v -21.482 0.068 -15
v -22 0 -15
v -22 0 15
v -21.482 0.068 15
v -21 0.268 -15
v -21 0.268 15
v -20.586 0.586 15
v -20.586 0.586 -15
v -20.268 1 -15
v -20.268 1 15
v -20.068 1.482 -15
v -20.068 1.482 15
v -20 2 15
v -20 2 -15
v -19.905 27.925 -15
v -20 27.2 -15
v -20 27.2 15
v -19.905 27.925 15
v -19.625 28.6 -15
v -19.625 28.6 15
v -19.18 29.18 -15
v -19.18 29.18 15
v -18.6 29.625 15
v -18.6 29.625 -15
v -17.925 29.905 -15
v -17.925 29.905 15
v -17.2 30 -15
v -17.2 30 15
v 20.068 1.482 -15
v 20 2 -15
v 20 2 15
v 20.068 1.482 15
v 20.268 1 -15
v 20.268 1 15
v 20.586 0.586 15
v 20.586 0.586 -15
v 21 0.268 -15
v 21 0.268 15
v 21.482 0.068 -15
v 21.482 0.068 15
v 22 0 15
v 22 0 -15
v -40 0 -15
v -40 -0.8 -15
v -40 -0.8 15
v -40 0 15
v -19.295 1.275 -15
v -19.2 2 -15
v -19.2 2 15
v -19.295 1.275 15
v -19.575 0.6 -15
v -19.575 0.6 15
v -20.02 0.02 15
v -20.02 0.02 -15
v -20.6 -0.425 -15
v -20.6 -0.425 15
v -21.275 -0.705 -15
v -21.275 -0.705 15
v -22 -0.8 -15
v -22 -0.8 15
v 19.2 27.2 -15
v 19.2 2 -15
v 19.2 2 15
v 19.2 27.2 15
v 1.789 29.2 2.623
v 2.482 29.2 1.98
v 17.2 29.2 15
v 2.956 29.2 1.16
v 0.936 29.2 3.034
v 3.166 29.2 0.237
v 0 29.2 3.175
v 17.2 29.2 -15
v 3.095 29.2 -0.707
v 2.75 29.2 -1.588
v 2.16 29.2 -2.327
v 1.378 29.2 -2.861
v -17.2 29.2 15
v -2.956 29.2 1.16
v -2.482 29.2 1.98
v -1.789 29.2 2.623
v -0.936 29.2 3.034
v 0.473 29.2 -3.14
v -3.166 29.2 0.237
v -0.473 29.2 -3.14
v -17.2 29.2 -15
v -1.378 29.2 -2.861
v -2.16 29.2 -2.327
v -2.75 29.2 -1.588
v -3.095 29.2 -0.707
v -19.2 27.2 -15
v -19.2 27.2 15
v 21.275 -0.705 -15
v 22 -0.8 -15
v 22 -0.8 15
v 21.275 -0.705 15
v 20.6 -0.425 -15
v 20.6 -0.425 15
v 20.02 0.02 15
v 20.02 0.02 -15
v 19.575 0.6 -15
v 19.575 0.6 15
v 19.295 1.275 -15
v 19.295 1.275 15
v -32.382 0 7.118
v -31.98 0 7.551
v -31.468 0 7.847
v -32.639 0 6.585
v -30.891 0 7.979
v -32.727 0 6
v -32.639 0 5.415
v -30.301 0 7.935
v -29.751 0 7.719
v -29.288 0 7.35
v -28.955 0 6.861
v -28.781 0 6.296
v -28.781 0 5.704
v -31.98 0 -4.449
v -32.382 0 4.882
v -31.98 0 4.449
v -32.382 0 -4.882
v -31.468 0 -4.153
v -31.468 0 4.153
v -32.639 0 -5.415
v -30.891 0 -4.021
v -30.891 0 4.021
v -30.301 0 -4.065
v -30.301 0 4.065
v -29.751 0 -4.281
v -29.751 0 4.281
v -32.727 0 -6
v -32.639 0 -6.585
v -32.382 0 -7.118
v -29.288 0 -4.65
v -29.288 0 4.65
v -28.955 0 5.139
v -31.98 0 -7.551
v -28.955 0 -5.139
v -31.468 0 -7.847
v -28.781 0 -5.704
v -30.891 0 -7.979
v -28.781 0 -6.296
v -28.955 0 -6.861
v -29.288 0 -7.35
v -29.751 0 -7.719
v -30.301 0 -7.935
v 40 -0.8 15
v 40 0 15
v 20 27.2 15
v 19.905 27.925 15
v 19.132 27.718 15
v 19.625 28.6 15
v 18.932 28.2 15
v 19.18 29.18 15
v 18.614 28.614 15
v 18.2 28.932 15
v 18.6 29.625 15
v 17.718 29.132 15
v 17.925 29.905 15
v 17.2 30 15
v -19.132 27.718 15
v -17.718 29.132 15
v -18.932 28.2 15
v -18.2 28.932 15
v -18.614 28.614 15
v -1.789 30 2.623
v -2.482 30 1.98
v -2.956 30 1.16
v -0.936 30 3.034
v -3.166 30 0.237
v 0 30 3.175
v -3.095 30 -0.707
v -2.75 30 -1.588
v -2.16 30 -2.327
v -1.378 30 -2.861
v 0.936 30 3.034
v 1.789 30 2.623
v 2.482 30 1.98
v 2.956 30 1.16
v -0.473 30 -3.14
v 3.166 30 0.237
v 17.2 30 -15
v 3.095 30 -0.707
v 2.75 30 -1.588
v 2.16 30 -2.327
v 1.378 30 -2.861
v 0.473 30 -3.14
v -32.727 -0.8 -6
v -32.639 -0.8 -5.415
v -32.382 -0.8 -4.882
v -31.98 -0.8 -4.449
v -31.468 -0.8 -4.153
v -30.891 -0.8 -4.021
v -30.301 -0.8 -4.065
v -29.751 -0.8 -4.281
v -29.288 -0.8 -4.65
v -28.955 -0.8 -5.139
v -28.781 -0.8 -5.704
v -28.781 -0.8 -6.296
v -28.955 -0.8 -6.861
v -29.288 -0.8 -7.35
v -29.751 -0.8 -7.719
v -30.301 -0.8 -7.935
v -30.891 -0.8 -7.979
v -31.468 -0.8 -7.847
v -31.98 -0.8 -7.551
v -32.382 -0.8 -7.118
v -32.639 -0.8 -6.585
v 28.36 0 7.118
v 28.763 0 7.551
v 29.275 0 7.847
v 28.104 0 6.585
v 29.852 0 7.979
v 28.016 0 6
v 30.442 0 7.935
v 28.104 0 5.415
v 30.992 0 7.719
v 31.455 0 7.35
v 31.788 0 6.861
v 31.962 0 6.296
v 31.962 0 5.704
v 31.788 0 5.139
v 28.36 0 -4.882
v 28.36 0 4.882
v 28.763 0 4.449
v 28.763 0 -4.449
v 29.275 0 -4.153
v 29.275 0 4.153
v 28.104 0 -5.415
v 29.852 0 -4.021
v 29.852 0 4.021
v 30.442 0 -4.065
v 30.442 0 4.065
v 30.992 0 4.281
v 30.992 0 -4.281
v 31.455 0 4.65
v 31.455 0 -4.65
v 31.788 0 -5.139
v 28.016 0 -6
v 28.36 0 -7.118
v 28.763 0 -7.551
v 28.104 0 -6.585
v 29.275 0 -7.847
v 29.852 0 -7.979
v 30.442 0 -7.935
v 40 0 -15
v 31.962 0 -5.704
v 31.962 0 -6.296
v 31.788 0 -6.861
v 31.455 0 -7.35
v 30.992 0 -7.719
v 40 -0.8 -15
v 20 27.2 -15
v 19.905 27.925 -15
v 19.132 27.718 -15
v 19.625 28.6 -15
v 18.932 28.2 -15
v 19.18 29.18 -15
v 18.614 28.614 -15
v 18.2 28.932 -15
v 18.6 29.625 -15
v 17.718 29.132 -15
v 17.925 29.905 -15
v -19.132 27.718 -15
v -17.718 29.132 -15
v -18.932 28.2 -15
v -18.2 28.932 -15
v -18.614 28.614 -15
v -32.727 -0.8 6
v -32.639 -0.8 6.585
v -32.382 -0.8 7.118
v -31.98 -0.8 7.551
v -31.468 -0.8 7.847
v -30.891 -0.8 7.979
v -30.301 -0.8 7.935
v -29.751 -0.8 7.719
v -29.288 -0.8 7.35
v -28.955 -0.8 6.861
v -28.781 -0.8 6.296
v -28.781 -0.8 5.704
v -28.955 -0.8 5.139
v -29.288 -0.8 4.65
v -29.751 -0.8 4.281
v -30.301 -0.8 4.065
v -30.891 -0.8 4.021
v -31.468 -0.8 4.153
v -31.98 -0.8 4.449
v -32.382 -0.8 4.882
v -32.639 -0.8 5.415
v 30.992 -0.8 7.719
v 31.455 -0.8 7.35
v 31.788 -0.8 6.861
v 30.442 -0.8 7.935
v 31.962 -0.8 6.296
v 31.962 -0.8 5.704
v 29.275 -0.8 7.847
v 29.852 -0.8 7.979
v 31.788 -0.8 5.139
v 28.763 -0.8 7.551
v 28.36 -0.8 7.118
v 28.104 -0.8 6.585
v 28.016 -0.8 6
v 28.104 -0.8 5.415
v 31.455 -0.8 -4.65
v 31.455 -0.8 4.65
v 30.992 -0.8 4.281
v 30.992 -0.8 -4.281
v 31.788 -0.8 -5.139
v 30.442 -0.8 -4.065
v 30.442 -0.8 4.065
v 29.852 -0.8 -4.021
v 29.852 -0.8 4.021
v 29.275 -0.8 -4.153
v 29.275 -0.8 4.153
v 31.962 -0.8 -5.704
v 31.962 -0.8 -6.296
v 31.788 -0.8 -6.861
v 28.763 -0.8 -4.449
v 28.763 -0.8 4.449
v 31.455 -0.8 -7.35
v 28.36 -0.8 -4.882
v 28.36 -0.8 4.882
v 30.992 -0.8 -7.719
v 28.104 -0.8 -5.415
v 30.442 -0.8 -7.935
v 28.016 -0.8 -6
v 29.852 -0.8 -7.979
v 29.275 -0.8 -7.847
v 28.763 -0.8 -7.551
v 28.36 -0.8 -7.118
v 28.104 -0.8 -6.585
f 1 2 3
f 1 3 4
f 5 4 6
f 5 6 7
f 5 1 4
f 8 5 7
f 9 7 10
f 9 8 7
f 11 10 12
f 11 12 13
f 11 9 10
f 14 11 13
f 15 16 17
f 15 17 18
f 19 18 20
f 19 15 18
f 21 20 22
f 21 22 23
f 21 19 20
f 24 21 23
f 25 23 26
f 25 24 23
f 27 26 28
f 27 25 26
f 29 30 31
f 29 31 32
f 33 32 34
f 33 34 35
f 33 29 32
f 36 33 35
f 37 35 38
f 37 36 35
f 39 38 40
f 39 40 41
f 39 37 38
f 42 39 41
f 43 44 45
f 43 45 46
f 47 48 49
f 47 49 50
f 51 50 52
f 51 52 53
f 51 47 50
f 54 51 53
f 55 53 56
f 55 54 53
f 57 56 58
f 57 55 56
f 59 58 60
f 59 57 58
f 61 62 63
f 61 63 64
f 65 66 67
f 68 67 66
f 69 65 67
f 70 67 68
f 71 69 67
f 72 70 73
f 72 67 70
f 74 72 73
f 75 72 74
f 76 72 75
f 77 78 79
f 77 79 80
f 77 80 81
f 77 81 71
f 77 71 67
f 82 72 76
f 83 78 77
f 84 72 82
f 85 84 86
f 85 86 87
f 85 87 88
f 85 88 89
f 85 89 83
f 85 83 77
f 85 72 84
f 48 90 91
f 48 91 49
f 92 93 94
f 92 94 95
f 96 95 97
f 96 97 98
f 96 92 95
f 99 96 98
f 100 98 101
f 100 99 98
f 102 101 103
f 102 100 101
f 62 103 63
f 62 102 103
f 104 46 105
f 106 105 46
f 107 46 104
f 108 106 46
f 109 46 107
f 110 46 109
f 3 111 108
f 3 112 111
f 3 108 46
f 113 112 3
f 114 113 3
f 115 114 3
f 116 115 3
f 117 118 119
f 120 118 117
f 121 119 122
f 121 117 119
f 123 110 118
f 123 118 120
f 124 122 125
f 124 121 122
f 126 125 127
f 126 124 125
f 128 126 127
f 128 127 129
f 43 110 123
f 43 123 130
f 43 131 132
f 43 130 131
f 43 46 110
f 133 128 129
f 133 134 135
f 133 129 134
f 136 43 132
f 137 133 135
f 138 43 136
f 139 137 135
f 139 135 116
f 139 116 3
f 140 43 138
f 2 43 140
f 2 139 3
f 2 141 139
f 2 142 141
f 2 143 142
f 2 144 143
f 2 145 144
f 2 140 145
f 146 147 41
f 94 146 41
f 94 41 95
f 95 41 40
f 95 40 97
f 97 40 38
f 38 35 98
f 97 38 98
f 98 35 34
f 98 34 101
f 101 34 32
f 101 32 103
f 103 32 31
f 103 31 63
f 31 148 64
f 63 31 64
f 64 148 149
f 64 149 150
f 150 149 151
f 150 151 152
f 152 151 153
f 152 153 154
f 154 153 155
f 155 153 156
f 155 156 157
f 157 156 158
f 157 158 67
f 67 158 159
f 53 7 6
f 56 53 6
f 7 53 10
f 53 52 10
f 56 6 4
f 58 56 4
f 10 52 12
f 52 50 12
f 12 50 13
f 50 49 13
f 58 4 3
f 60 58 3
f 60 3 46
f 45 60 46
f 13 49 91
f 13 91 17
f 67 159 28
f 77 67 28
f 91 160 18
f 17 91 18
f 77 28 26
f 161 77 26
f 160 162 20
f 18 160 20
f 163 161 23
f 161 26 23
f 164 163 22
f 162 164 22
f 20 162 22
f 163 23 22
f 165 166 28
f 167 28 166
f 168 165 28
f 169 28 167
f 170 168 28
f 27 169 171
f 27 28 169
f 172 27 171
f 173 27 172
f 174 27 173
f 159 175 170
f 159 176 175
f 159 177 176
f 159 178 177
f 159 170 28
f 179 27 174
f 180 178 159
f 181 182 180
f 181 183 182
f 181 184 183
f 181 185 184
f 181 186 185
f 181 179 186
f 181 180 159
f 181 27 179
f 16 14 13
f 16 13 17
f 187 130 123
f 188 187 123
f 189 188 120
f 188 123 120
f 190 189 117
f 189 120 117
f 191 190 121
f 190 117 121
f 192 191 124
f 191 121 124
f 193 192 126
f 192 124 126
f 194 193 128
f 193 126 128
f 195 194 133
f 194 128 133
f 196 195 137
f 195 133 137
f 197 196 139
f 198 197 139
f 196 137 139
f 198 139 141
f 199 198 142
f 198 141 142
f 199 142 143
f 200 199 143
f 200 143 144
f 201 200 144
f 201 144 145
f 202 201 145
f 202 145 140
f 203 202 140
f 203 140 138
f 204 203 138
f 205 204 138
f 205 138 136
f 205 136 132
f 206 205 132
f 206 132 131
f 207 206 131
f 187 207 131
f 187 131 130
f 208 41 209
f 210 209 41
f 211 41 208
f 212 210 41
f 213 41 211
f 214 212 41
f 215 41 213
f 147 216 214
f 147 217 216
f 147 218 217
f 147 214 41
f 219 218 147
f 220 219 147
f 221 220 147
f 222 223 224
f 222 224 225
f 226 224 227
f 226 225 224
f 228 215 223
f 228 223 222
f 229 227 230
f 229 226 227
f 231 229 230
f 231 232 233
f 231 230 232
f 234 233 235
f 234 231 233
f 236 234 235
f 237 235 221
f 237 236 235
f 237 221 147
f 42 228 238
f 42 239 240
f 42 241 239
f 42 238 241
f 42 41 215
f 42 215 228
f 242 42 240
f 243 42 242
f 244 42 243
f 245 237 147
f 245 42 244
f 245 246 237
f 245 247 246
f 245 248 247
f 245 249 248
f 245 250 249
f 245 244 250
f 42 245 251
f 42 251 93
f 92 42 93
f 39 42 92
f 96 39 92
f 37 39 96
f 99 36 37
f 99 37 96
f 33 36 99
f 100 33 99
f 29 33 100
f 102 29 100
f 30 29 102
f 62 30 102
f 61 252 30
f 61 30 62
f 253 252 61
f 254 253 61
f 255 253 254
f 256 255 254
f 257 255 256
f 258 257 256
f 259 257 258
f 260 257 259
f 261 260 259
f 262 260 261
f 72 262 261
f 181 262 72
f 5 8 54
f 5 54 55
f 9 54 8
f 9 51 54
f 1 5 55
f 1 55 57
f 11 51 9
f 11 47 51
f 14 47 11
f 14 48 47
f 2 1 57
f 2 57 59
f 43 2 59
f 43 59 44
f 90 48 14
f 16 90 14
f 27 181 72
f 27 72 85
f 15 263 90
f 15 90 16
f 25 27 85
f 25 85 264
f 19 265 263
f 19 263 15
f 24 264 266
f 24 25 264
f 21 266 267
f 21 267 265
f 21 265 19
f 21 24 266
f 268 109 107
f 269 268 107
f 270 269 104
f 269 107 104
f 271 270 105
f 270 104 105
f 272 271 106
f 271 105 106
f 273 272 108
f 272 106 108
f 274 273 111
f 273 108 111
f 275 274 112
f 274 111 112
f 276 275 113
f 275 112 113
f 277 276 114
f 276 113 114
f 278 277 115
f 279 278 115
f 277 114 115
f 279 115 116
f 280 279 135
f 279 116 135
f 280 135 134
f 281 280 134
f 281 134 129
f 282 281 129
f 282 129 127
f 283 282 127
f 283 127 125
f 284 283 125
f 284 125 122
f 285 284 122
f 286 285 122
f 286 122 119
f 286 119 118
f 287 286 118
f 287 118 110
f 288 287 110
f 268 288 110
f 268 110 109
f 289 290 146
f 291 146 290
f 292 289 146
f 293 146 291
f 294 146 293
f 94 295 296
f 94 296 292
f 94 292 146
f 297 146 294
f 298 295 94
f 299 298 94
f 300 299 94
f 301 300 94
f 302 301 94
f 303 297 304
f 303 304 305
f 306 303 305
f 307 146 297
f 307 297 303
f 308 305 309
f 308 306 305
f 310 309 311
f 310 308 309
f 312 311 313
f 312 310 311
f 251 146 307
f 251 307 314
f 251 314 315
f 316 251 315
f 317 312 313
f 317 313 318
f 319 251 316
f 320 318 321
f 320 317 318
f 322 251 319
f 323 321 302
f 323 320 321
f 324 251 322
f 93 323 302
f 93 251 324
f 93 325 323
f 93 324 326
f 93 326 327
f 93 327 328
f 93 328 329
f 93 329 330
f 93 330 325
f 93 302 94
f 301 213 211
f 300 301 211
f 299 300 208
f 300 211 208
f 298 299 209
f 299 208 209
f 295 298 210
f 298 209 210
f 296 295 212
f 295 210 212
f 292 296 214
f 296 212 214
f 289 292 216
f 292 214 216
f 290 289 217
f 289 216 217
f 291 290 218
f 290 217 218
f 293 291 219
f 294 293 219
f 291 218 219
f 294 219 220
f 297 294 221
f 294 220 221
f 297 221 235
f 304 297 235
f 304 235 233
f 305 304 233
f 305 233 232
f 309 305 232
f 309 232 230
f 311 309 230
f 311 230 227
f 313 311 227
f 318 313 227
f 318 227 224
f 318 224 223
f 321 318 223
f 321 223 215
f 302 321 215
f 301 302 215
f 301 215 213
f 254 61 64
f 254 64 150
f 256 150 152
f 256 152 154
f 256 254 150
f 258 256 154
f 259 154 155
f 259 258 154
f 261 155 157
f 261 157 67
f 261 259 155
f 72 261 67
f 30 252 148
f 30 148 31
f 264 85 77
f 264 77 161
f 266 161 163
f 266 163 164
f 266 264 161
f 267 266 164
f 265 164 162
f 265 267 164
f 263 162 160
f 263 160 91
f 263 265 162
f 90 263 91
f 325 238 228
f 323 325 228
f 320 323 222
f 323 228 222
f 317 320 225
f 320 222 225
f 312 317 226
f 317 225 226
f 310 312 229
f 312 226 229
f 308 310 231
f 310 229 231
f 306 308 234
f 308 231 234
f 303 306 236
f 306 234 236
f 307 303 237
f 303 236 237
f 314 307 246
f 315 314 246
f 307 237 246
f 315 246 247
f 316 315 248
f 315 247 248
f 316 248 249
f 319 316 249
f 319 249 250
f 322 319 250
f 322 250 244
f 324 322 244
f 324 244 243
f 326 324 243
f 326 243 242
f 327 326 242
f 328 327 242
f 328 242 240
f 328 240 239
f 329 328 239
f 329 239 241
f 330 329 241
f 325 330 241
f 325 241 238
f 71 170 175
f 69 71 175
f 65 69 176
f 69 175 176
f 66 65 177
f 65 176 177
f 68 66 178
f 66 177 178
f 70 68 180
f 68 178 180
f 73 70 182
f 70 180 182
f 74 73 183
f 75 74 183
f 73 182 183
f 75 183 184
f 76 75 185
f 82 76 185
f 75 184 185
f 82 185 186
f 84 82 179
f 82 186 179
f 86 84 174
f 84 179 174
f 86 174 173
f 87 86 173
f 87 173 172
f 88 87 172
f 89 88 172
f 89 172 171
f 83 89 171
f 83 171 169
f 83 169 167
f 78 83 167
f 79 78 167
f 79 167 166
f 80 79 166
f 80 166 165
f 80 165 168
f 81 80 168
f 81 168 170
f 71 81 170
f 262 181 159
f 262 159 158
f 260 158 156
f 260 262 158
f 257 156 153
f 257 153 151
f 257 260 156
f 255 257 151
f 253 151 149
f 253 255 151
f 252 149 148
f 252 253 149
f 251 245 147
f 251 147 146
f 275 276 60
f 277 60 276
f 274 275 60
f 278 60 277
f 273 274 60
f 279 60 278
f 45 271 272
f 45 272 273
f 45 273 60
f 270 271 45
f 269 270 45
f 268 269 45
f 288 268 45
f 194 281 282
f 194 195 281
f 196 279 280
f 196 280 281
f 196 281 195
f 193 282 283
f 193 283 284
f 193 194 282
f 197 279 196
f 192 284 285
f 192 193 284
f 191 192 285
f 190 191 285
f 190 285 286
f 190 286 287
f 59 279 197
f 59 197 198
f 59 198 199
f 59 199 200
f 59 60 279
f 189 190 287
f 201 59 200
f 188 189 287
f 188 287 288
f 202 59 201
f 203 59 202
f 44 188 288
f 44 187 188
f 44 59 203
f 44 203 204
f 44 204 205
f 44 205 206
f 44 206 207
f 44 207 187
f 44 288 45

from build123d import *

# Parameters (mm, degrees)
BASE_FLANGE1_DEPTH      = 15
BASE_FLANGE1_DEPTH_BACK = 15
SKETCH6_R               = 3.175
CUT_EXTRUDE1_DEPTH      = 53.665358634
SKETCH7_R               = 1.984375
CUT_EXTRUDE2_DEPTH      = 10


# Sheet-metal steps are written as plain solids
with BuildPart() as part:
    # Sketch1 → Base-Flange1 (new, two sides: drawn at the far end of the back side and taken through both)
    with BuildSketch(Plane.XY.offset(-BASE_FLANGE1_DEPTH_BACK)):
        with BuildLine():
            Line((-40, 0), (-22, 0))
            ThreePointArc((-22, 0), (-20.585786438, 0.585786438), (-20, 2))
            Line((-20, 2), (-20, 27.2))
            ThreePointArc((-20, 27.2), (-19.179898987, 29.179898987), (-17.2, 30))
            Line((-17.2, 30), (17.2, 30))
            ThreePointArc((17.2, 30), (19.179898987, 29.179898987), (20, 27.2))
            Line((20, 27.2), (20, 2))
            ThreePointArc((20, 2), (20.585786438, 0.585786438), (22, 0))
            Line((22, 0), (40, 0))
            Line((40, 0), (40, -0.8))
            Line((40, -0.8), (22, -0.8))
            ThreePointArc((22, -0.8), (20.020101013, 0.020101013), (19.2, 2))
            Line((19.2, 2), (19.2, 27.2))
            ThreePointArc((19.2, 27.2), (18.614213562, 28.614213562), (17.2, 29.2))
            Line((17.2, 29.2), (-17.2, 29.2))
            ThreePointArc((-17.2, 29.2), (-18.614213562, 28.614213562), (-19.2, 27.2))
            Line((-19.2, 27.2), (-19.2, 2))
            ThreePointArc((-19.2, 2), (-20.020101013, 0.020101013), (-22, -0.8))
            Line((-22, -0.8), (-40, -0.8))
            Line((-40, -0.8), (-40, 0))
        make_face()
    extrude(amount=BASE_FLANGE1_DEPTH + BASE_FLANGE1_DEPTH_BACK)

    # Sketch6 → Cut-Extrude1 (cut, through all)
    with BuildSketch(Plane(origin=(0, 30, 0), x_dir=(1, 0, 0), z_dir=(0, 1, 0))):
        with Locations(Location((0, 0, 0), (0, 0, 270))):
            Circle(SKETCH6_R)
    extrude(amount=-CUT_EXTRUDE1_DEPTH, mode=Mode.SUBTRACT)

    # Sketch7 → Cut-Extrude2 (cut)
    with BuildSketch(Plane(origin=(0, 0, 0), x_dir=(1, 0, 0), z_dir=(0, 1, 0))):
        with Locations(Location((30, -6, 0), (0, 0, 180))):
            Circle(SKETCH7_R)
        with Locations(Location((30, 6, 0), (0, 0, 180))):
            Circle(SKETCH7_R)
        with Locations(Location((-30.742868113, 6, 0), (0, 0, 180))):
            Circle(SKETCH7_R)
        with Locations(Location((-30.742868113, -6, 0), (0, 0, 180))):
            Circle(SKETCH7_R)
    extrude(amount=-CUT_EXTRUDE2_DEPTH, mode=Mode.SUBTRACT)


solid = part.part
